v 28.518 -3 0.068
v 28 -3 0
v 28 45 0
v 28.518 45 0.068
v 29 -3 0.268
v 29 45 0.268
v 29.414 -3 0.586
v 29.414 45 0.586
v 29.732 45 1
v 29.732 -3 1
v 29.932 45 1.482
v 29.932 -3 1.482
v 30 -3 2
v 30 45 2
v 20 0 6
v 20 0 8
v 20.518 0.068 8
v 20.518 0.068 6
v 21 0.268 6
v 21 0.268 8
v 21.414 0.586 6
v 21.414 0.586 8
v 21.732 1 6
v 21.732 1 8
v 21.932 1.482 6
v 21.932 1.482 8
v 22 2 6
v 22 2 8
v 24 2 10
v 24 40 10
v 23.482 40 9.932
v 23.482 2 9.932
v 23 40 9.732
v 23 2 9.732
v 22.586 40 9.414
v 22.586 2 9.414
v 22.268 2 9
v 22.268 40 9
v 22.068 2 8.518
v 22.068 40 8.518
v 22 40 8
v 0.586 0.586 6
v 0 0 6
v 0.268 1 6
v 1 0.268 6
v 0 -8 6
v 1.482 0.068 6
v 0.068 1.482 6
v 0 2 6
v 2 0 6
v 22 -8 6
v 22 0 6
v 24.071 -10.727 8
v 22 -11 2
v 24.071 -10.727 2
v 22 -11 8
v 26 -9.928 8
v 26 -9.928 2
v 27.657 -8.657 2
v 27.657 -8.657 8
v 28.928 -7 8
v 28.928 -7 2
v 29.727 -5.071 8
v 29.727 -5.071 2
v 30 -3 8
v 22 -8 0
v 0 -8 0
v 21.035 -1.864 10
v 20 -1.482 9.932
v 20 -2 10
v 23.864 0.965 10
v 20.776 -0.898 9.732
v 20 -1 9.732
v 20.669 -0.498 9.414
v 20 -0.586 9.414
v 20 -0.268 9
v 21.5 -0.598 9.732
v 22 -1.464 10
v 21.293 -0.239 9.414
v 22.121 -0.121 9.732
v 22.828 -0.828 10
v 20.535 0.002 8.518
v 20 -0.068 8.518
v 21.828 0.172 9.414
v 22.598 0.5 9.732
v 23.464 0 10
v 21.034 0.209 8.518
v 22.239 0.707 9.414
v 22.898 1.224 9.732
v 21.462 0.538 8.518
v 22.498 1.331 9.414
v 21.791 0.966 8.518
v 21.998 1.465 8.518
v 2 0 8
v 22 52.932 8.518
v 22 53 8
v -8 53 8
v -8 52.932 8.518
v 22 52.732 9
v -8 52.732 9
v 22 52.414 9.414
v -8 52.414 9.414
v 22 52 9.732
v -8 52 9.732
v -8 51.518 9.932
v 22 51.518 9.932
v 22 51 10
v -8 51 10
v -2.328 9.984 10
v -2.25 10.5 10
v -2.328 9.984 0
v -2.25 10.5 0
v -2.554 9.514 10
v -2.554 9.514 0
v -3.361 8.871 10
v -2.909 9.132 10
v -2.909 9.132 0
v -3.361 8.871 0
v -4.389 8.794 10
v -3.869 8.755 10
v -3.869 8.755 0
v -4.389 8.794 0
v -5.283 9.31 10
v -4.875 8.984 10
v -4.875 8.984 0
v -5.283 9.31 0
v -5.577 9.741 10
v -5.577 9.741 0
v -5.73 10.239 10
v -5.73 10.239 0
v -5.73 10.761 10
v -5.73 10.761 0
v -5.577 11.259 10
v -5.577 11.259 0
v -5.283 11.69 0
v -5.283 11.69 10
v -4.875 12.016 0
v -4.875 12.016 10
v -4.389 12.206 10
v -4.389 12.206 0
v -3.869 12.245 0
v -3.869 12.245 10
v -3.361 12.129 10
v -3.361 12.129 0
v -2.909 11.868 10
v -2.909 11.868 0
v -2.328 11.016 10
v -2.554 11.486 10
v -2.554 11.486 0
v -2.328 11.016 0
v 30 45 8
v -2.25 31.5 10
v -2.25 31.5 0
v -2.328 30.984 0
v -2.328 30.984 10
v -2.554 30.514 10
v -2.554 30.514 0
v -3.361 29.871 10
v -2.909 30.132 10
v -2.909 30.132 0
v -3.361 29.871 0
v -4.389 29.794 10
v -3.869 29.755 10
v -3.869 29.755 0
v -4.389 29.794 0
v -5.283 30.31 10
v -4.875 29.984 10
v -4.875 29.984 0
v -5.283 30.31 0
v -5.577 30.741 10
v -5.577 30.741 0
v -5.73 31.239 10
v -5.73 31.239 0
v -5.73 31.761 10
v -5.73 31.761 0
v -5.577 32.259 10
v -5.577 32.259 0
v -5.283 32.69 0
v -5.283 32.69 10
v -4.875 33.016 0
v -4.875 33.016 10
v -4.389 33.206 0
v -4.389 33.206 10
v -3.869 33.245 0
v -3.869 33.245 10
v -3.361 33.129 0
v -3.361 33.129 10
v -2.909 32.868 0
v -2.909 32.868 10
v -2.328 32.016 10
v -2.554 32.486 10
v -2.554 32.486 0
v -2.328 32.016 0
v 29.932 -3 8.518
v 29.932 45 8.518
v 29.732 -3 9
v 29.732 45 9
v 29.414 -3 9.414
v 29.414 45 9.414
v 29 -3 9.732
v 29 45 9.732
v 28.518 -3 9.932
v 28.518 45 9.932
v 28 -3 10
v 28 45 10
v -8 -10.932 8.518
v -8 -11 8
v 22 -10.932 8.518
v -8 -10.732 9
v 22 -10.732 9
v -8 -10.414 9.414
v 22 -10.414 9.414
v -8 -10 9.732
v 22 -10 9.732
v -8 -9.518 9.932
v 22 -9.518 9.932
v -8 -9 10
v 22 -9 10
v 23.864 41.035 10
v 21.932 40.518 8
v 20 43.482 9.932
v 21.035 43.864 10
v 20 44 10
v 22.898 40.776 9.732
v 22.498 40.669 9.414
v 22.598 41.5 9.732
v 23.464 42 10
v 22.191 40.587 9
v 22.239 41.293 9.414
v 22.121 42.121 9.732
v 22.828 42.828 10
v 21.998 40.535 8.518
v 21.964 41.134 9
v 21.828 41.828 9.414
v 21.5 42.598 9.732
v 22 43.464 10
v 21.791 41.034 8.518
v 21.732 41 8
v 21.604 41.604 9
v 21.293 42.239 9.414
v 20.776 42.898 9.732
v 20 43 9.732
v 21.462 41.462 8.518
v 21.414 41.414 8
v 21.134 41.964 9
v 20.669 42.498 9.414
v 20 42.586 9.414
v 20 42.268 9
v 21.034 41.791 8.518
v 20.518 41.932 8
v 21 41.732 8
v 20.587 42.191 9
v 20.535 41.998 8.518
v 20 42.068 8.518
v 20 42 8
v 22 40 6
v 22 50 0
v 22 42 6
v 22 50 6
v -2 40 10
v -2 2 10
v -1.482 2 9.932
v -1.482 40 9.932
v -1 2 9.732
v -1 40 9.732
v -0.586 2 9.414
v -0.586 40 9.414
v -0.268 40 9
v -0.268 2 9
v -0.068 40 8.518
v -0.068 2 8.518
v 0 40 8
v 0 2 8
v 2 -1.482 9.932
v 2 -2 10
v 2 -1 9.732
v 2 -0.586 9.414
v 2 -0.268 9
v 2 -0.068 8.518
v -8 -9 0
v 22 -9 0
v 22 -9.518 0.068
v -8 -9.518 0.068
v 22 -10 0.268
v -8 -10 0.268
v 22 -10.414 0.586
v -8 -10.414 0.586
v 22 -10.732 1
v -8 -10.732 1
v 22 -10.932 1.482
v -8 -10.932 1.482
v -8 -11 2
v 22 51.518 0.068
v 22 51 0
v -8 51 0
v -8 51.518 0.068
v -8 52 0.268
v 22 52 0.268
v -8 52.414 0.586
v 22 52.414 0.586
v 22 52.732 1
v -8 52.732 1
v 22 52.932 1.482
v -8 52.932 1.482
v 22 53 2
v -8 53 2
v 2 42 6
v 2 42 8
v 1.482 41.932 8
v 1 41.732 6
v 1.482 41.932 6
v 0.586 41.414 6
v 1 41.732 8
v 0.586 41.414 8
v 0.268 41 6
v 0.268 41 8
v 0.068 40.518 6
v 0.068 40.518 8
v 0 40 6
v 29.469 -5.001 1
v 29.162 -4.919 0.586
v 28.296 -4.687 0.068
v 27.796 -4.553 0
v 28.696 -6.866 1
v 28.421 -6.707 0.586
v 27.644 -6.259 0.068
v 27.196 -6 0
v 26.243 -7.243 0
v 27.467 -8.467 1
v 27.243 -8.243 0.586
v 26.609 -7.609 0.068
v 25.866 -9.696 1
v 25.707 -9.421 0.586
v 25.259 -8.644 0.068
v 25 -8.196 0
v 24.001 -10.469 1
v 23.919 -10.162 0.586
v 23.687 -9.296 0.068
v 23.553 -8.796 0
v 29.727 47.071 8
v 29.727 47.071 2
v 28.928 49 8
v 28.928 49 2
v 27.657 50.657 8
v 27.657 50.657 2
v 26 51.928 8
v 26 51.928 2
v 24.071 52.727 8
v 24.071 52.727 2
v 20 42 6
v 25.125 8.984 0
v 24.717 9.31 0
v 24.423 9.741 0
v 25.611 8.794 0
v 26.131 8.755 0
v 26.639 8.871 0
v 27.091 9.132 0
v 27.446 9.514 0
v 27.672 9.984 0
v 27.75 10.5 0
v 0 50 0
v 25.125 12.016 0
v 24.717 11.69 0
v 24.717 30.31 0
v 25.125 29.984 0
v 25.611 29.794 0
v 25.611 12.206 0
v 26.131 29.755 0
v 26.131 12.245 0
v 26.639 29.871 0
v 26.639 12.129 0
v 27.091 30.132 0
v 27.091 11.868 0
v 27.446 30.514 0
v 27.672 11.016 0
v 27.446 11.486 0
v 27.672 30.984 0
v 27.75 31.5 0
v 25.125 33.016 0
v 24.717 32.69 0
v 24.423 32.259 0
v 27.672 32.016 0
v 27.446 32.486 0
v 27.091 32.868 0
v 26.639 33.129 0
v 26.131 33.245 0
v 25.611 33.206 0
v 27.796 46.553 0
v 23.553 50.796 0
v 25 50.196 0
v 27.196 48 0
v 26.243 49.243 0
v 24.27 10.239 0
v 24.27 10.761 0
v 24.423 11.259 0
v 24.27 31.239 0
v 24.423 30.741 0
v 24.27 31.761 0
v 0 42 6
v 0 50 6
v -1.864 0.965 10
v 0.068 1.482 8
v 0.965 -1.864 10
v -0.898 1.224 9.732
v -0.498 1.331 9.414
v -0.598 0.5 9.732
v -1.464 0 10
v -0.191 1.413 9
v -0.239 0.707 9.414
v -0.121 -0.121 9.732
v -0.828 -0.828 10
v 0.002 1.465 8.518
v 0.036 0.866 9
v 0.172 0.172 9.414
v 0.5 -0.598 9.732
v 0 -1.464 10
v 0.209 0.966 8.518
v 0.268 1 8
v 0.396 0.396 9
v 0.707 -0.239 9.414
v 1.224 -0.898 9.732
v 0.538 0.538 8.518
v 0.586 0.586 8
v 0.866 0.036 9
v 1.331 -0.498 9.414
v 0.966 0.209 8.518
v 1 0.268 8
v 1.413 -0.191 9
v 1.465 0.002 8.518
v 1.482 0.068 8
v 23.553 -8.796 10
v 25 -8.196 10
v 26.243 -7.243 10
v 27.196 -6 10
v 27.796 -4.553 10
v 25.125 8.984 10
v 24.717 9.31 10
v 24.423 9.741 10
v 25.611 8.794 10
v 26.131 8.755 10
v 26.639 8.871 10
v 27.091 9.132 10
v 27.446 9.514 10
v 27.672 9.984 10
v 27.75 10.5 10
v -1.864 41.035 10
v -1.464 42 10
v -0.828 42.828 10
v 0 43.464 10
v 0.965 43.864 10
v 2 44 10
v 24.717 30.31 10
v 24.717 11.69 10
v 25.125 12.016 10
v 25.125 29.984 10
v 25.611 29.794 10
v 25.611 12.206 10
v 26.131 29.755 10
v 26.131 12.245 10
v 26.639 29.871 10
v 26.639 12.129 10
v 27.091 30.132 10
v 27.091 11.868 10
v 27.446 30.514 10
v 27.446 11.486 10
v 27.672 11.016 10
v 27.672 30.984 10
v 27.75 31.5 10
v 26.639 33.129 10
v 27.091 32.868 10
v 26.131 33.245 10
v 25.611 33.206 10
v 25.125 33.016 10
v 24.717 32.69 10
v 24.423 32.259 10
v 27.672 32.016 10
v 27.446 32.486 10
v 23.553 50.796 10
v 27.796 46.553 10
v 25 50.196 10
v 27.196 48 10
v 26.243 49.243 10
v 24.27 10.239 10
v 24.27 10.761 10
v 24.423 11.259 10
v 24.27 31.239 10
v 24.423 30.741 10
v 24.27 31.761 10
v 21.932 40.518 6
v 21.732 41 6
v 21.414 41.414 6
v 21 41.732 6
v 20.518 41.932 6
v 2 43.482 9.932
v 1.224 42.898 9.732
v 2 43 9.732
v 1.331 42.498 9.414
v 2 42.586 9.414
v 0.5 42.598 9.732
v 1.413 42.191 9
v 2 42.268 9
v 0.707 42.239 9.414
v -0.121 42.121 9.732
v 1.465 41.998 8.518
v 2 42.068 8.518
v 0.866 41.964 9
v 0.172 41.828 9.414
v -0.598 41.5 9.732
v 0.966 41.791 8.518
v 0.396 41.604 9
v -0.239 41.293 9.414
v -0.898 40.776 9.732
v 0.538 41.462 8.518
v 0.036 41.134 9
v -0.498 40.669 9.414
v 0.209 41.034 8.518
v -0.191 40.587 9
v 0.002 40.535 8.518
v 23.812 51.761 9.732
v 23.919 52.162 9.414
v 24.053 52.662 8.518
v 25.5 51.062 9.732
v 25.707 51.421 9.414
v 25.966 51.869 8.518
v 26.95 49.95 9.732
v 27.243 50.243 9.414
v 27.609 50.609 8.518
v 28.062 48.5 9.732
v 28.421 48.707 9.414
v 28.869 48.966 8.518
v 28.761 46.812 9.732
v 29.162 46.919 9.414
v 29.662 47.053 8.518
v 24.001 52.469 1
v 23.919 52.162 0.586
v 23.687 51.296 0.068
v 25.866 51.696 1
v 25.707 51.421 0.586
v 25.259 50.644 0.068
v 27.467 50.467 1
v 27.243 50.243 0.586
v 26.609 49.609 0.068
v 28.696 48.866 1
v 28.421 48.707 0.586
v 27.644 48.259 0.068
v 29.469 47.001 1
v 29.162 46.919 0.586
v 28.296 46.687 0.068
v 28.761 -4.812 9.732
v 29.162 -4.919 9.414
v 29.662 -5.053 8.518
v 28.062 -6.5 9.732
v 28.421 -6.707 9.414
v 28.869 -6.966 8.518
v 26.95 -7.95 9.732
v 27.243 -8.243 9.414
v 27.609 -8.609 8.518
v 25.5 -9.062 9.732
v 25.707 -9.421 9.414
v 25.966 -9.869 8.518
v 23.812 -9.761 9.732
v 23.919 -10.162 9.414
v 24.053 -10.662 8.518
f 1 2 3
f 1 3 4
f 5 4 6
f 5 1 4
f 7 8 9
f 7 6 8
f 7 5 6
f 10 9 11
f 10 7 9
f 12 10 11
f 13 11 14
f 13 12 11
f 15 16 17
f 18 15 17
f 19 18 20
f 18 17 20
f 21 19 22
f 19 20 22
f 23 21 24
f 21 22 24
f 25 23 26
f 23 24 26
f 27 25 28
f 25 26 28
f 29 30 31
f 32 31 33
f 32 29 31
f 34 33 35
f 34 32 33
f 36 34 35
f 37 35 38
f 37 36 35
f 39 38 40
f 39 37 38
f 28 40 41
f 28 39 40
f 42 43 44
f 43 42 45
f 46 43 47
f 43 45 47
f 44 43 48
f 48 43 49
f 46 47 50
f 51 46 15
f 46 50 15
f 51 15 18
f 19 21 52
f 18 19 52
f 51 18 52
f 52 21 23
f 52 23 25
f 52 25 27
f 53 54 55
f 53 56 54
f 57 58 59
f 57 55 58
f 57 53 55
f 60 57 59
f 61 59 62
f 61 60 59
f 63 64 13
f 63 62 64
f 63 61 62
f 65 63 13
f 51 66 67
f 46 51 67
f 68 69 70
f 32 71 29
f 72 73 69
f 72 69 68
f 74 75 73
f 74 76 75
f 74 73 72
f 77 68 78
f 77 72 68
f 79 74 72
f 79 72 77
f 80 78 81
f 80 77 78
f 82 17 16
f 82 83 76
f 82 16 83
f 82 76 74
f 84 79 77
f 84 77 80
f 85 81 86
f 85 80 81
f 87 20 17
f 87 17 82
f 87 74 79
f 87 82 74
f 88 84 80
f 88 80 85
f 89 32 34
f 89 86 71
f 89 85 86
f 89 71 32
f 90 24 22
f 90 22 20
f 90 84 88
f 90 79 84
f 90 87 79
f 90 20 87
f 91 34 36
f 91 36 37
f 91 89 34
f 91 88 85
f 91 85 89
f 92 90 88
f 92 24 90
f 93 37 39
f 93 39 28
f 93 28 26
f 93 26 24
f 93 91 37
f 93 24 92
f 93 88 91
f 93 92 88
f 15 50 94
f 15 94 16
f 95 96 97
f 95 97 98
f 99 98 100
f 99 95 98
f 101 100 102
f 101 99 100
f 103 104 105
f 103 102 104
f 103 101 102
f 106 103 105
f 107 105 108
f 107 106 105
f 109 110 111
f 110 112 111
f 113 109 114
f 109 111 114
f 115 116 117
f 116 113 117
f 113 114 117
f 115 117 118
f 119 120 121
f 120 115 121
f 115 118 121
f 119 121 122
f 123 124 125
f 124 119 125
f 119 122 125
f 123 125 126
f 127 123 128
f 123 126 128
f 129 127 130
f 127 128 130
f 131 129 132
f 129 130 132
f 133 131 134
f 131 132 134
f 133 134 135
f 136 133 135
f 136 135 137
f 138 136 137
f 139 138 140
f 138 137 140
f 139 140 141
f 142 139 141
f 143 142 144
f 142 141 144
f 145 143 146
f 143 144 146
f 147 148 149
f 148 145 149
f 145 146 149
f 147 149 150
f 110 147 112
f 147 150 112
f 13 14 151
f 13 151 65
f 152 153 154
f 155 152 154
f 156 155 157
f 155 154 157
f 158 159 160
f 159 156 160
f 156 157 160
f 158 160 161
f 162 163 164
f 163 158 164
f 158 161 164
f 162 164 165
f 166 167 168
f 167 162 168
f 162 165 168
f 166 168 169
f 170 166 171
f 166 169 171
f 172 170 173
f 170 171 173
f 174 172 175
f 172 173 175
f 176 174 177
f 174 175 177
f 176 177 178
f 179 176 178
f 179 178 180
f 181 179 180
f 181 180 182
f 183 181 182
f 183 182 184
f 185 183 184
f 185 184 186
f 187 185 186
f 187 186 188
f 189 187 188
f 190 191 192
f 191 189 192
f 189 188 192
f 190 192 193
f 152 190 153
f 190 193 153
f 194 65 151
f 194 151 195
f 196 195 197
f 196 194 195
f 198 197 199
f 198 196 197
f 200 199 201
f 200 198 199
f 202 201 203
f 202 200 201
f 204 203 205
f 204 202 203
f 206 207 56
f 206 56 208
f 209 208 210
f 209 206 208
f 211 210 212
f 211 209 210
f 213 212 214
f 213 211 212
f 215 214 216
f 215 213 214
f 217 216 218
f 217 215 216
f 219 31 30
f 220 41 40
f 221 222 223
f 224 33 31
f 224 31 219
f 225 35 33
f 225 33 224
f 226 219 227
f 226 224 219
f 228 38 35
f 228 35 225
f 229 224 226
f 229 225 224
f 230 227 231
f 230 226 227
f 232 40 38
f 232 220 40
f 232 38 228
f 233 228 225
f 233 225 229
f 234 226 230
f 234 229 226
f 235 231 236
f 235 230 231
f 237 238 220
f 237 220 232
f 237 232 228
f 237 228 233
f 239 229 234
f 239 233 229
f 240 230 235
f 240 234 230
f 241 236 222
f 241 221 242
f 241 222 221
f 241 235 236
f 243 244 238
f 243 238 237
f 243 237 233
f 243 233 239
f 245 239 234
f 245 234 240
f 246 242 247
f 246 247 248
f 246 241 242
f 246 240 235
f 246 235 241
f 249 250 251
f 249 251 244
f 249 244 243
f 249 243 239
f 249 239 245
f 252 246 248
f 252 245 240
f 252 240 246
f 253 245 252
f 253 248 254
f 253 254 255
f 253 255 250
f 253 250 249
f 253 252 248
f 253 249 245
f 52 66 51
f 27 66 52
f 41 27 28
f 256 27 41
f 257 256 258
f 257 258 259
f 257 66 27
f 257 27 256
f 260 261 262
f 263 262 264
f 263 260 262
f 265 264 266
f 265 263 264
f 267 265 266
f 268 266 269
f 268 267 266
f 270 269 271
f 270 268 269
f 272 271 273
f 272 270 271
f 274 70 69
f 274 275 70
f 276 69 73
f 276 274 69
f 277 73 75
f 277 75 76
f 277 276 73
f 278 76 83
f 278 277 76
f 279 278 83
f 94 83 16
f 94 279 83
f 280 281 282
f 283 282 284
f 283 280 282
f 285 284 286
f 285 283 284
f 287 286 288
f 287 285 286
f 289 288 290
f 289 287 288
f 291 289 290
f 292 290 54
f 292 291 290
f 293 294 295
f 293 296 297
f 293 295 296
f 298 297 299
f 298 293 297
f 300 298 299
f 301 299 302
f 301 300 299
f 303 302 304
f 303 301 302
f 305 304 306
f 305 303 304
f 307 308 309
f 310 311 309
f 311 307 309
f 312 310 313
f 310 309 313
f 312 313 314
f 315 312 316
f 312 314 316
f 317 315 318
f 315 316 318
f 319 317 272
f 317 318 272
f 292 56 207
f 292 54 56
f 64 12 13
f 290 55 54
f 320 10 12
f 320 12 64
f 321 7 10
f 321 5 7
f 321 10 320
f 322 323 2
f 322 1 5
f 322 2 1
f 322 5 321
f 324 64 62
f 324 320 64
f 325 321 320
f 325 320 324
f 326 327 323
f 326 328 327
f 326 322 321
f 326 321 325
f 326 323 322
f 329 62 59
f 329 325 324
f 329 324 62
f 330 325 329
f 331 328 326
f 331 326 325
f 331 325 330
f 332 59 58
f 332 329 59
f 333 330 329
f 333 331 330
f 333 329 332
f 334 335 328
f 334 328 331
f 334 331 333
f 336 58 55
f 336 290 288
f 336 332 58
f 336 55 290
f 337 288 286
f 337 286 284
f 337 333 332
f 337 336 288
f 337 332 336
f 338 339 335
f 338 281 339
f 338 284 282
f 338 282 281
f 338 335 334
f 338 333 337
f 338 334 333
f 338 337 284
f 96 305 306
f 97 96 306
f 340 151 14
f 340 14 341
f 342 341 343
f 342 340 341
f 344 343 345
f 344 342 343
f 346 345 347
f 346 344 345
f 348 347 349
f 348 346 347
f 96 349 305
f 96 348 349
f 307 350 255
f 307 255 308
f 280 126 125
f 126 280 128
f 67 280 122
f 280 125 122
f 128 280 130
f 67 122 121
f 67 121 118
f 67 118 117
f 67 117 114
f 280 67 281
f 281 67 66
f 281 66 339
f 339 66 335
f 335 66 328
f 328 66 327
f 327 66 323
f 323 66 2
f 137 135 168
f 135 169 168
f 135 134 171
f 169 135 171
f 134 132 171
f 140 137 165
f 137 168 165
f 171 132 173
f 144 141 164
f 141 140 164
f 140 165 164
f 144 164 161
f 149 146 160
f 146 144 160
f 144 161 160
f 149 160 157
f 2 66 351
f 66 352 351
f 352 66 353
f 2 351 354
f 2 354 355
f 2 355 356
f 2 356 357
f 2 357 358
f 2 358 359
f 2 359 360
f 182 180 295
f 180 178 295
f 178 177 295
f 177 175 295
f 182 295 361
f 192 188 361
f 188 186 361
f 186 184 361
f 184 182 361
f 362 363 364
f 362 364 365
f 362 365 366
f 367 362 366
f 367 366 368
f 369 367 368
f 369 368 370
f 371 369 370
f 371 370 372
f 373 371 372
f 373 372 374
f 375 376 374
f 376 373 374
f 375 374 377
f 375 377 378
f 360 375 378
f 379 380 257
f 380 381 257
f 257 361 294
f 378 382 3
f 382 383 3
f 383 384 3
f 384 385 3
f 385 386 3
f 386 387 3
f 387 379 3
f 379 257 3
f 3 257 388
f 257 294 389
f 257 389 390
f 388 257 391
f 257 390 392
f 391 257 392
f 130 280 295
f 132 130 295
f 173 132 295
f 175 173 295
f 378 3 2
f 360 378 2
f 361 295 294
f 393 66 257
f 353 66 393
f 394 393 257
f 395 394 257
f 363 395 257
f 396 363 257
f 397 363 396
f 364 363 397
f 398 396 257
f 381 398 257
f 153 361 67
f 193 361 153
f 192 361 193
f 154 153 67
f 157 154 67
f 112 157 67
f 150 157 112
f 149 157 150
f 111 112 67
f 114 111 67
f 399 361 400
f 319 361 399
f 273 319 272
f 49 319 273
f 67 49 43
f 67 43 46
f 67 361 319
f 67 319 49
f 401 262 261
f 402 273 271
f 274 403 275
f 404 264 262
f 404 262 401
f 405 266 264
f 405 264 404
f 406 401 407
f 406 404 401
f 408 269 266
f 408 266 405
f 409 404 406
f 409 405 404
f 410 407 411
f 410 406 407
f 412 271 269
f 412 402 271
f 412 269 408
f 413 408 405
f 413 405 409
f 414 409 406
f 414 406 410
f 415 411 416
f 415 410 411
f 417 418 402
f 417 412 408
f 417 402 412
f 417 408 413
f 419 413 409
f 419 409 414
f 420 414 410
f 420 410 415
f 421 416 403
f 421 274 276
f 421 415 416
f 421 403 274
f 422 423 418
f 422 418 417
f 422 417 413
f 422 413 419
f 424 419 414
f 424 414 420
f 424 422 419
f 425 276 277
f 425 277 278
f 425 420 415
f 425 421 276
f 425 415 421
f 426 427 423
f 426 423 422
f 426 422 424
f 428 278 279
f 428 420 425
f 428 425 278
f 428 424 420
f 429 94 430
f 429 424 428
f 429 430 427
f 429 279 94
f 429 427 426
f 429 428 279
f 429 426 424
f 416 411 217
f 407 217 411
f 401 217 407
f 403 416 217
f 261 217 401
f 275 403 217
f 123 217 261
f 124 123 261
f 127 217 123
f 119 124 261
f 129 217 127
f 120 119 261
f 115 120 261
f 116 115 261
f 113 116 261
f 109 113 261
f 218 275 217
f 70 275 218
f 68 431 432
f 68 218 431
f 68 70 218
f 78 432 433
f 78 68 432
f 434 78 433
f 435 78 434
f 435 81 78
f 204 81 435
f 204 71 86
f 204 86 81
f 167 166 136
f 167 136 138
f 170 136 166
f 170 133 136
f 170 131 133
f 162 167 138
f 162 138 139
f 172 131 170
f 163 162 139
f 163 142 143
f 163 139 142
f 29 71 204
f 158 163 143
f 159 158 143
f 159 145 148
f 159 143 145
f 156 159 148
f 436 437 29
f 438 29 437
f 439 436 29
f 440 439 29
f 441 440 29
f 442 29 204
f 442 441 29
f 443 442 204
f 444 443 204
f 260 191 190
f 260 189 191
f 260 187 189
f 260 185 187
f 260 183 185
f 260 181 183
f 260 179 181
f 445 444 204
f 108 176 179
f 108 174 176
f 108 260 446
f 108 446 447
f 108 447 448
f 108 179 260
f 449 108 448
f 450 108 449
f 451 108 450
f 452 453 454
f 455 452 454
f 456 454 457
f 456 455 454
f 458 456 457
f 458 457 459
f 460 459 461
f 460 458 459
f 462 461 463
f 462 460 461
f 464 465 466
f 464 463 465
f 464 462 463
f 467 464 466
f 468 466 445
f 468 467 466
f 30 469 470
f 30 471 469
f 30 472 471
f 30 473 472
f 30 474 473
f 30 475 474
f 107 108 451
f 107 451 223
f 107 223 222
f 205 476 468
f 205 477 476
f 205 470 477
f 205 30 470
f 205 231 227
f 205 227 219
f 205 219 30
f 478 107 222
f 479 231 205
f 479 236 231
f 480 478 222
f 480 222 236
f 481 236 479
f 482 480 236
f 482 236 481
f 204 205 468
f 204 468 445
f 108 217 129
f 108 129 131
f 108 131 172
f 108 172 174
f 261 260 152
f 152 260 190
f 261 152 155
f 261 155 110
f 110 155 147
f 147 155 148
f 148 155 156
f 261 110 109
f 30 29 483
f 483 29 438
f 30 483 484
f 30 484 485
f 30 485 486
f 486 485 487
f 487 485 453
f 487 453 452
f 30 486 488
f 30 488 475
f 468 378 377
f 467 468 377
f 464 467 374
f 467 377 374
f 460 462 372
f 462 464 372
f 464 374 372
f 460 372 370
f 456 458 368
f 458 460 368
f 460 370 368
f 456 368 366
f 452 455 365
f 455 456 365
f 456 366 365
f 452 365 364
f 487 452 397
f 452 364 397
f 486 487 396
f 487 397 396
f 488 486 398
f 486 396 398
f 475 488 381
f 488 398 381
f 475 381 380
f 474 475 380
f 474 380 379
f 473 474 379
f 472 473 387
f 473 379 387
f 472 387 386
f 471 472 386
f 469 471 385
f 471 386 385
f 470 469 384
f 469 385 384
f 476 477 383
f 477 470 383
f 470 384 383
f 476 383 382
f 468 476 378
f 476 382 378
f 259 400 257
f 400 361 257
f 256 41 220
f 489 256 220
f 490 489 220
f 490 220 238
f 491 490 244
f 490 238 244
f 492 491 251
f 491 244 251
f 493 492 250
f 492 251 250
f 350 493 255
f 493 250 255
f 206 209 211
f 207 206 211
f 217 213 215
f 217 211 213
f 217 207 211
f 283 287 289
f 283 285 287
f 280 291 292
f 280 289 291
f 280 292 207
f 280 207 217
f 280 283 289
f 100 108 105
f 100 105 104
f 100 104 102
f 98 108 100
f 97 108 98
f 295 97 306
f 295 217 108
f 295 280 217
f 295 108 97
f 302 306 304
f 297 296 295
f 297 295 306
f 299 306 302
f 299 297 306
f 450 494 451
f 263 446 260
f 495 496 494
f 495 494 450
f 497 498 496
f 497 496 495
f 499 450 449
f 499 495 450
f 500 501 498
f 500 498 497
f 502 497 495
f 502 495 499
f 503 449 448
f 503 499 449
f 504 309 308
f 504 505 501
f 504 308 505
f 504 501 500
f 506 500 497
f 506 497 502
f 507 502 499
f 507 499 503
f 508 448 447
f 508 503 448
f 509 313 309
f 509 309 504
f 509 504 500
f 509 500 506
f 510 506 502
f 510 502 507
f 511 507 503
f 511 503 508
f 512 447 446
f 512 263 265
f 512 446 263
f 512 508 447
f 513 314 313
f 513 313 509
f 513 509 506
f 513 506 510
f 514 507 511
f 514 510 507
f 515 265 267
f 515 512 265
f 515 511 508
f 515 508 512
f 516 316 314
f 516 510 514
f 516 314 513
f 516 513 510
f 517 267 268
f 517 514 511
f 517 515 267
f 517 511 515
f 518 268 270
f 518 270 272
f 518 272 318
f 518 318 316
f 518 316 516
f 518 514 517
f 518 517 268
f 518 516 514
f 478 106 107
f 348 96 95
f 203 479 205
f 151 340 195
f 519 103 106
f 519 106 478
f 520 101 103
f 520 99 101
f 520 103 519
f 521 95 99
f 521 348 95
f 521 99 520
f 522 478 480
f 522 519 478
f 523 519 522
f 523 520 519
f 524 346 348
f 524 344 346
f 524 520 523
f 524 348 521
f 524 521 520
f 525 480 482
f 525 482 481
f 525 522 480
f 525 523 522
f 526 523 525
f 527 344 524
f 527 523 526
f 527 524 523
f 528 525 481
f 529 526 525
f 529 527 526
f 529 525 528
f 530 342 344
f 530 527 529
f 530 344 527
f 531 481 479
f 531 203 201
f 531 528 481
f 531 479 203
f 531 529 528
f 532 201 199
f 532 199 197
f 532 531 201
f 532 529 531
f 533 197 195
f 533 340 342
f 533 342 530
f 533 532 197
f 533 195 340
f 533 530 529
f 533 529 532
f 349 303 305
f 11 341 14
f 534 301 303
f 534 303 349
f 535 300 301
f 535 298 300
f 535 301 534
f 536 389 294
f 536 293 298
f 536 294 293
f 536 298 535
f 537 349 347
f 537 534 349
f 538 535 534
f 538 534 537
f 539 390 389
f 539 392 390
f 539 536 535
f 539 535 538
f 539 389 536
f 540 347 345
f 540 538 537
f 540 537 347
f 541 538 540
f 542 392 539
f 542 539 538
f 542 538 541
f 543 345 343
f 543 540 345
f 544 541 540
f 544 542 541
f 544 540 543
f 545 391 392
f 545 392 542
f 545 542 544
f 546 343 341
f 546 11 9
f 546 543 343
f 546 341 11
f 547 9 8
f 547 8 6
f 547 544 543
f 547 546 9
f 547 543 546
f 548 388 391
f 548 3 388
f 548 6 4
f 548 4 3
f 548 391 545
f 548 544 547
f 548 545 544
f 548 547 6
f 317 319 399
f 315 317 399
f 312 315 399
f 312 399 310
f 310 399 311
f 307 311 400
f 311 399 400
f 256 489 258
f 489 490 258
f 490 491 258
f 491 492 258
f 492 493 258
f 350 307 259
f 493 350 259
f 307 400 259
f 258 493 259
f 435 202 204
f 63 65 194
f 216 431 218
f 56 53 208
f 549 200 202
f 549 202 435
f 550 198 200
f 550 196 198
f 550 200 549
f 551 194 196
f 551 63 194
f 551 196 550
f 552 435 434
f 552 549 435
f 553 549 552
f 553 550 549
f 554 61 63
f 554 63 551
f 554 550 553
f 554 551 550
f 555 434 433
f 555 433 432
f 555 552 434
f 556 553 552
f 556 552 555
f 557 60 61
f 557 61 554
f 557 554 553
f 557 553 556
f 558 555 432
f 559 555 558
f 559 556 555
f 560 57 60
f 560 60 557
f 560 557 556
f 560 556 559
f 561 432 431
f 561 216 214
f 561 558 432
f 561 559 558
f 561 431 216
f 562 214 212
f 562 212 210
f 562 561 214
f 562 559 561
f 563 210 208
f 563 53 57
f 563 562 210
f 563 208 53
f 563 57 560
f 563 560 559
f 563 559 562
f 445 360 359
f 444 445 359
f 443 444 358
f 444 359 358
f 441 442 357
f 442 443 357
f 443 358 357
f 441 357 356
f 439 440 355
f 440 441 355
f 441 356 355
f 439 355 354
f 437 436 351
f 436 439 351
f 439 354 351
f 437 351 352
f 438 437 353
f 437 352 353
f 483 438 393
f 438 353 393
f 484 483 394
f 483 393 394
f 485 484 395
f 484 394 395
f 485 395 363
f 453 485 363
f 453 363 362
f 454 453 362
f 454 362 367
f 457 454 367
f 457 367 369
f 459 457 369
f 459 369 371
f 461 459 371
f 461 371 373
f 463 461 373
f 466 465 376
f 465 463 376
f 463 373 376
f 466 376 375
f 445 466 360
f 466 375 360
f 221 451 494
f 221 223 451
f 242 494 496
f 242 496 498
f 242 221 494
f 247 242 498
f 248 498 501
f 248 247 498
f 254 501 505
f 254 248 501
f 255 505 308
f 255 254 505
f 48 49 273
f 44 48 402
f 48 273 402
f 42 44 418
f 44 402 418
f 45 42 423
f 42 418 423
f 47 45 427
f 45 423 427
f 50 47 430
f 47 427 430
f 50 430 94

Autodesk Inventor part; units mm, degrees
ref_plane "YZ Plane" through (0, 0, 0) normal (1, 0, 0) x (0, 1, 0)
ref_plane "XZ Plane" through (0, 0, 0) normal (0, 1, 0) x (-1, 0, 0)
ref_plane "XY Plane" through (0, 0, 0) normal (0, 0, 1) x (1, 0, 0)
sketch "Sketch1" plane through (0, 0, 0) normal (0, 0, 1) x (1, 0, 0)
  line L0 (0, 0) -> (22, 0)
  line L1 (22, 0) -> (22, 42)
  line L2 (22, 42) -> (0, 42)
  line L3 (0, 42) -> (0, 0)
  line L4 (-8, 50) -> (30, 50)
  line L5 (30, 50) -> (30, -8)
  line L6 (30, -8) -> (-8, -8)
  line L7 (-8, -8) -> (-8, 50)
  line L8 (0, 21) -> (22, 21) construction
  line L9 (11, 0) -> (11, 42) construction
  circle A0 centre (26, 10.5) radius 1.75
  circle A1 centre (26, 31.5) radius 1.75
  circle A2 centre (-4, 10.5) radius 1.75
  circle A3 centre (-4, 31.5) radius 1.75
  line L10 (0, 50) -> (22, 50)
  line L11 (22, 42) -> (0, 42)
  line L12 (0, 0) -> (22, 0)
  line L13 (22, -8) -> (0, -8)
  line L14 (5.4779, 42) -> (18.0265, 42)
  line L15 (5.4779, 0) -> (19.7232, 0)
  line L16 (0, 42) -> (0, 50)
  line L17 (22, 42) -> (22, 50)
  line L18 (0, 0) -> (0, -8)
  line L19 (22, 0) -> (22, -8)
  line L20 (-8, 50) -> (30, 50)
  line L21 (30, 50) -> (30, 53)
  line L22 (30, 53) -> (-8, 53)
  line L23 (-8, 53) -> (-8, 50)
  line L24 (-8, -8) -> (30, -8)
  line L25 (30, -8) -> (30, -11)
  line L26 (30, -11) -> (-8, -11)
  line L27 (-8, -11) -> (-8, -8)
  dimension "d0" = 42
  dimension "d2" = 8
  dimension "d3" = 3.5
  dimension "d4" = 10.5
  dimension "d5" = 4
  dimension "d6" = 8
  dimension "d15" = 22
  dimension "d16" = 22
  dimension "d17" = 22
  dimension "d18" = 3
  dimension "d19" = 38
  dimension "d20" = 38
  dimension "d21" = 3
extrude "Extrusion1" add sketch "Sketch1" along normal blind 10 contours L18 L6 L7 L4 L16 L3 | L0 L19 L6 L18 | L16 L4 L17 L2 | L6 L25 L26 L27 | L4 L23 L22 L21 | L19 L1 L17 L4 L5 L6
extrude "Extrusion2" cut sketch "Sketch1" along normal blind 6 contours L0 L19 L6 L18 | L16 L4 L17 L2
fillet "Fillet1" radius 8 2 edges at (30, -11, 5) (30, 53, 5)
fillet "Fillet2" radius 2 4 edges at (0, 42, 8) (0, 0, 8) (22, 0, 8) (22, 42, 8)
fillet "Fillet3" radius 2 12 edges at (27.6569, 50.6569, 10) (27.6569, -8.6569, 10) (7, -11, 10) (7, 53, 10) (27.6569, 50.6569, 0) (27.6569, -8.6569, 0) (7, -11, 0) (7, 53, 0) (11, 0, 10) (0, 21, 10) (11, 42, 10) (22, 21, 10)
equation "\"d0\" = MOUNT_LENGTH"
equation "\"d2\" = MOUNT_THICKNESS"
equation "\"d3\" = ThroughDiameter"
equation "\"d4\" = 0.25 * MOUNT_LENGTH"
equation "\"d5\" = 0.5 * MOUNT_THICKNESS"
equation "\"d15\" = MOUNT_WIDTH"
equation "\"d18\" = -0.5 * MOUNT_LENGTH + 0.5 * COXA_JOINT_LENGTH"
equation "\"d19\" = MOUNT_WIDTH + 2 * MOUNT_THICKNESS"
equation "\"d20\" = MOUNT_WIDTH + 2 * MOUNT_THICKNESS"
equation "\"d21\" = -0.5 * MOUNT_LENGTH + 0.5 * COXA_JOINT_LENGTH"
equation "\"d22\" = OUTER_FILLET"
equation "\"d13\" = INNER_FILLET"
equation "\"d23\" = INNER_FILLET"
equation "\"ThroughDiameter\" = 3.5"
equation "\"MOUNT_LENGTH\" = 42"
equation "\"MOUNT_THICKNESS\" = 8"
equation "\"MOUNT_WIDTH\" = 22"
equation "\"COXA_JOINT_LENGTH\" = 48"
equation "\"OUTER_FILLET\" = 8"
equation "\"INNER_FILLET\" = 2"
properties part number "CoxaLeft"
